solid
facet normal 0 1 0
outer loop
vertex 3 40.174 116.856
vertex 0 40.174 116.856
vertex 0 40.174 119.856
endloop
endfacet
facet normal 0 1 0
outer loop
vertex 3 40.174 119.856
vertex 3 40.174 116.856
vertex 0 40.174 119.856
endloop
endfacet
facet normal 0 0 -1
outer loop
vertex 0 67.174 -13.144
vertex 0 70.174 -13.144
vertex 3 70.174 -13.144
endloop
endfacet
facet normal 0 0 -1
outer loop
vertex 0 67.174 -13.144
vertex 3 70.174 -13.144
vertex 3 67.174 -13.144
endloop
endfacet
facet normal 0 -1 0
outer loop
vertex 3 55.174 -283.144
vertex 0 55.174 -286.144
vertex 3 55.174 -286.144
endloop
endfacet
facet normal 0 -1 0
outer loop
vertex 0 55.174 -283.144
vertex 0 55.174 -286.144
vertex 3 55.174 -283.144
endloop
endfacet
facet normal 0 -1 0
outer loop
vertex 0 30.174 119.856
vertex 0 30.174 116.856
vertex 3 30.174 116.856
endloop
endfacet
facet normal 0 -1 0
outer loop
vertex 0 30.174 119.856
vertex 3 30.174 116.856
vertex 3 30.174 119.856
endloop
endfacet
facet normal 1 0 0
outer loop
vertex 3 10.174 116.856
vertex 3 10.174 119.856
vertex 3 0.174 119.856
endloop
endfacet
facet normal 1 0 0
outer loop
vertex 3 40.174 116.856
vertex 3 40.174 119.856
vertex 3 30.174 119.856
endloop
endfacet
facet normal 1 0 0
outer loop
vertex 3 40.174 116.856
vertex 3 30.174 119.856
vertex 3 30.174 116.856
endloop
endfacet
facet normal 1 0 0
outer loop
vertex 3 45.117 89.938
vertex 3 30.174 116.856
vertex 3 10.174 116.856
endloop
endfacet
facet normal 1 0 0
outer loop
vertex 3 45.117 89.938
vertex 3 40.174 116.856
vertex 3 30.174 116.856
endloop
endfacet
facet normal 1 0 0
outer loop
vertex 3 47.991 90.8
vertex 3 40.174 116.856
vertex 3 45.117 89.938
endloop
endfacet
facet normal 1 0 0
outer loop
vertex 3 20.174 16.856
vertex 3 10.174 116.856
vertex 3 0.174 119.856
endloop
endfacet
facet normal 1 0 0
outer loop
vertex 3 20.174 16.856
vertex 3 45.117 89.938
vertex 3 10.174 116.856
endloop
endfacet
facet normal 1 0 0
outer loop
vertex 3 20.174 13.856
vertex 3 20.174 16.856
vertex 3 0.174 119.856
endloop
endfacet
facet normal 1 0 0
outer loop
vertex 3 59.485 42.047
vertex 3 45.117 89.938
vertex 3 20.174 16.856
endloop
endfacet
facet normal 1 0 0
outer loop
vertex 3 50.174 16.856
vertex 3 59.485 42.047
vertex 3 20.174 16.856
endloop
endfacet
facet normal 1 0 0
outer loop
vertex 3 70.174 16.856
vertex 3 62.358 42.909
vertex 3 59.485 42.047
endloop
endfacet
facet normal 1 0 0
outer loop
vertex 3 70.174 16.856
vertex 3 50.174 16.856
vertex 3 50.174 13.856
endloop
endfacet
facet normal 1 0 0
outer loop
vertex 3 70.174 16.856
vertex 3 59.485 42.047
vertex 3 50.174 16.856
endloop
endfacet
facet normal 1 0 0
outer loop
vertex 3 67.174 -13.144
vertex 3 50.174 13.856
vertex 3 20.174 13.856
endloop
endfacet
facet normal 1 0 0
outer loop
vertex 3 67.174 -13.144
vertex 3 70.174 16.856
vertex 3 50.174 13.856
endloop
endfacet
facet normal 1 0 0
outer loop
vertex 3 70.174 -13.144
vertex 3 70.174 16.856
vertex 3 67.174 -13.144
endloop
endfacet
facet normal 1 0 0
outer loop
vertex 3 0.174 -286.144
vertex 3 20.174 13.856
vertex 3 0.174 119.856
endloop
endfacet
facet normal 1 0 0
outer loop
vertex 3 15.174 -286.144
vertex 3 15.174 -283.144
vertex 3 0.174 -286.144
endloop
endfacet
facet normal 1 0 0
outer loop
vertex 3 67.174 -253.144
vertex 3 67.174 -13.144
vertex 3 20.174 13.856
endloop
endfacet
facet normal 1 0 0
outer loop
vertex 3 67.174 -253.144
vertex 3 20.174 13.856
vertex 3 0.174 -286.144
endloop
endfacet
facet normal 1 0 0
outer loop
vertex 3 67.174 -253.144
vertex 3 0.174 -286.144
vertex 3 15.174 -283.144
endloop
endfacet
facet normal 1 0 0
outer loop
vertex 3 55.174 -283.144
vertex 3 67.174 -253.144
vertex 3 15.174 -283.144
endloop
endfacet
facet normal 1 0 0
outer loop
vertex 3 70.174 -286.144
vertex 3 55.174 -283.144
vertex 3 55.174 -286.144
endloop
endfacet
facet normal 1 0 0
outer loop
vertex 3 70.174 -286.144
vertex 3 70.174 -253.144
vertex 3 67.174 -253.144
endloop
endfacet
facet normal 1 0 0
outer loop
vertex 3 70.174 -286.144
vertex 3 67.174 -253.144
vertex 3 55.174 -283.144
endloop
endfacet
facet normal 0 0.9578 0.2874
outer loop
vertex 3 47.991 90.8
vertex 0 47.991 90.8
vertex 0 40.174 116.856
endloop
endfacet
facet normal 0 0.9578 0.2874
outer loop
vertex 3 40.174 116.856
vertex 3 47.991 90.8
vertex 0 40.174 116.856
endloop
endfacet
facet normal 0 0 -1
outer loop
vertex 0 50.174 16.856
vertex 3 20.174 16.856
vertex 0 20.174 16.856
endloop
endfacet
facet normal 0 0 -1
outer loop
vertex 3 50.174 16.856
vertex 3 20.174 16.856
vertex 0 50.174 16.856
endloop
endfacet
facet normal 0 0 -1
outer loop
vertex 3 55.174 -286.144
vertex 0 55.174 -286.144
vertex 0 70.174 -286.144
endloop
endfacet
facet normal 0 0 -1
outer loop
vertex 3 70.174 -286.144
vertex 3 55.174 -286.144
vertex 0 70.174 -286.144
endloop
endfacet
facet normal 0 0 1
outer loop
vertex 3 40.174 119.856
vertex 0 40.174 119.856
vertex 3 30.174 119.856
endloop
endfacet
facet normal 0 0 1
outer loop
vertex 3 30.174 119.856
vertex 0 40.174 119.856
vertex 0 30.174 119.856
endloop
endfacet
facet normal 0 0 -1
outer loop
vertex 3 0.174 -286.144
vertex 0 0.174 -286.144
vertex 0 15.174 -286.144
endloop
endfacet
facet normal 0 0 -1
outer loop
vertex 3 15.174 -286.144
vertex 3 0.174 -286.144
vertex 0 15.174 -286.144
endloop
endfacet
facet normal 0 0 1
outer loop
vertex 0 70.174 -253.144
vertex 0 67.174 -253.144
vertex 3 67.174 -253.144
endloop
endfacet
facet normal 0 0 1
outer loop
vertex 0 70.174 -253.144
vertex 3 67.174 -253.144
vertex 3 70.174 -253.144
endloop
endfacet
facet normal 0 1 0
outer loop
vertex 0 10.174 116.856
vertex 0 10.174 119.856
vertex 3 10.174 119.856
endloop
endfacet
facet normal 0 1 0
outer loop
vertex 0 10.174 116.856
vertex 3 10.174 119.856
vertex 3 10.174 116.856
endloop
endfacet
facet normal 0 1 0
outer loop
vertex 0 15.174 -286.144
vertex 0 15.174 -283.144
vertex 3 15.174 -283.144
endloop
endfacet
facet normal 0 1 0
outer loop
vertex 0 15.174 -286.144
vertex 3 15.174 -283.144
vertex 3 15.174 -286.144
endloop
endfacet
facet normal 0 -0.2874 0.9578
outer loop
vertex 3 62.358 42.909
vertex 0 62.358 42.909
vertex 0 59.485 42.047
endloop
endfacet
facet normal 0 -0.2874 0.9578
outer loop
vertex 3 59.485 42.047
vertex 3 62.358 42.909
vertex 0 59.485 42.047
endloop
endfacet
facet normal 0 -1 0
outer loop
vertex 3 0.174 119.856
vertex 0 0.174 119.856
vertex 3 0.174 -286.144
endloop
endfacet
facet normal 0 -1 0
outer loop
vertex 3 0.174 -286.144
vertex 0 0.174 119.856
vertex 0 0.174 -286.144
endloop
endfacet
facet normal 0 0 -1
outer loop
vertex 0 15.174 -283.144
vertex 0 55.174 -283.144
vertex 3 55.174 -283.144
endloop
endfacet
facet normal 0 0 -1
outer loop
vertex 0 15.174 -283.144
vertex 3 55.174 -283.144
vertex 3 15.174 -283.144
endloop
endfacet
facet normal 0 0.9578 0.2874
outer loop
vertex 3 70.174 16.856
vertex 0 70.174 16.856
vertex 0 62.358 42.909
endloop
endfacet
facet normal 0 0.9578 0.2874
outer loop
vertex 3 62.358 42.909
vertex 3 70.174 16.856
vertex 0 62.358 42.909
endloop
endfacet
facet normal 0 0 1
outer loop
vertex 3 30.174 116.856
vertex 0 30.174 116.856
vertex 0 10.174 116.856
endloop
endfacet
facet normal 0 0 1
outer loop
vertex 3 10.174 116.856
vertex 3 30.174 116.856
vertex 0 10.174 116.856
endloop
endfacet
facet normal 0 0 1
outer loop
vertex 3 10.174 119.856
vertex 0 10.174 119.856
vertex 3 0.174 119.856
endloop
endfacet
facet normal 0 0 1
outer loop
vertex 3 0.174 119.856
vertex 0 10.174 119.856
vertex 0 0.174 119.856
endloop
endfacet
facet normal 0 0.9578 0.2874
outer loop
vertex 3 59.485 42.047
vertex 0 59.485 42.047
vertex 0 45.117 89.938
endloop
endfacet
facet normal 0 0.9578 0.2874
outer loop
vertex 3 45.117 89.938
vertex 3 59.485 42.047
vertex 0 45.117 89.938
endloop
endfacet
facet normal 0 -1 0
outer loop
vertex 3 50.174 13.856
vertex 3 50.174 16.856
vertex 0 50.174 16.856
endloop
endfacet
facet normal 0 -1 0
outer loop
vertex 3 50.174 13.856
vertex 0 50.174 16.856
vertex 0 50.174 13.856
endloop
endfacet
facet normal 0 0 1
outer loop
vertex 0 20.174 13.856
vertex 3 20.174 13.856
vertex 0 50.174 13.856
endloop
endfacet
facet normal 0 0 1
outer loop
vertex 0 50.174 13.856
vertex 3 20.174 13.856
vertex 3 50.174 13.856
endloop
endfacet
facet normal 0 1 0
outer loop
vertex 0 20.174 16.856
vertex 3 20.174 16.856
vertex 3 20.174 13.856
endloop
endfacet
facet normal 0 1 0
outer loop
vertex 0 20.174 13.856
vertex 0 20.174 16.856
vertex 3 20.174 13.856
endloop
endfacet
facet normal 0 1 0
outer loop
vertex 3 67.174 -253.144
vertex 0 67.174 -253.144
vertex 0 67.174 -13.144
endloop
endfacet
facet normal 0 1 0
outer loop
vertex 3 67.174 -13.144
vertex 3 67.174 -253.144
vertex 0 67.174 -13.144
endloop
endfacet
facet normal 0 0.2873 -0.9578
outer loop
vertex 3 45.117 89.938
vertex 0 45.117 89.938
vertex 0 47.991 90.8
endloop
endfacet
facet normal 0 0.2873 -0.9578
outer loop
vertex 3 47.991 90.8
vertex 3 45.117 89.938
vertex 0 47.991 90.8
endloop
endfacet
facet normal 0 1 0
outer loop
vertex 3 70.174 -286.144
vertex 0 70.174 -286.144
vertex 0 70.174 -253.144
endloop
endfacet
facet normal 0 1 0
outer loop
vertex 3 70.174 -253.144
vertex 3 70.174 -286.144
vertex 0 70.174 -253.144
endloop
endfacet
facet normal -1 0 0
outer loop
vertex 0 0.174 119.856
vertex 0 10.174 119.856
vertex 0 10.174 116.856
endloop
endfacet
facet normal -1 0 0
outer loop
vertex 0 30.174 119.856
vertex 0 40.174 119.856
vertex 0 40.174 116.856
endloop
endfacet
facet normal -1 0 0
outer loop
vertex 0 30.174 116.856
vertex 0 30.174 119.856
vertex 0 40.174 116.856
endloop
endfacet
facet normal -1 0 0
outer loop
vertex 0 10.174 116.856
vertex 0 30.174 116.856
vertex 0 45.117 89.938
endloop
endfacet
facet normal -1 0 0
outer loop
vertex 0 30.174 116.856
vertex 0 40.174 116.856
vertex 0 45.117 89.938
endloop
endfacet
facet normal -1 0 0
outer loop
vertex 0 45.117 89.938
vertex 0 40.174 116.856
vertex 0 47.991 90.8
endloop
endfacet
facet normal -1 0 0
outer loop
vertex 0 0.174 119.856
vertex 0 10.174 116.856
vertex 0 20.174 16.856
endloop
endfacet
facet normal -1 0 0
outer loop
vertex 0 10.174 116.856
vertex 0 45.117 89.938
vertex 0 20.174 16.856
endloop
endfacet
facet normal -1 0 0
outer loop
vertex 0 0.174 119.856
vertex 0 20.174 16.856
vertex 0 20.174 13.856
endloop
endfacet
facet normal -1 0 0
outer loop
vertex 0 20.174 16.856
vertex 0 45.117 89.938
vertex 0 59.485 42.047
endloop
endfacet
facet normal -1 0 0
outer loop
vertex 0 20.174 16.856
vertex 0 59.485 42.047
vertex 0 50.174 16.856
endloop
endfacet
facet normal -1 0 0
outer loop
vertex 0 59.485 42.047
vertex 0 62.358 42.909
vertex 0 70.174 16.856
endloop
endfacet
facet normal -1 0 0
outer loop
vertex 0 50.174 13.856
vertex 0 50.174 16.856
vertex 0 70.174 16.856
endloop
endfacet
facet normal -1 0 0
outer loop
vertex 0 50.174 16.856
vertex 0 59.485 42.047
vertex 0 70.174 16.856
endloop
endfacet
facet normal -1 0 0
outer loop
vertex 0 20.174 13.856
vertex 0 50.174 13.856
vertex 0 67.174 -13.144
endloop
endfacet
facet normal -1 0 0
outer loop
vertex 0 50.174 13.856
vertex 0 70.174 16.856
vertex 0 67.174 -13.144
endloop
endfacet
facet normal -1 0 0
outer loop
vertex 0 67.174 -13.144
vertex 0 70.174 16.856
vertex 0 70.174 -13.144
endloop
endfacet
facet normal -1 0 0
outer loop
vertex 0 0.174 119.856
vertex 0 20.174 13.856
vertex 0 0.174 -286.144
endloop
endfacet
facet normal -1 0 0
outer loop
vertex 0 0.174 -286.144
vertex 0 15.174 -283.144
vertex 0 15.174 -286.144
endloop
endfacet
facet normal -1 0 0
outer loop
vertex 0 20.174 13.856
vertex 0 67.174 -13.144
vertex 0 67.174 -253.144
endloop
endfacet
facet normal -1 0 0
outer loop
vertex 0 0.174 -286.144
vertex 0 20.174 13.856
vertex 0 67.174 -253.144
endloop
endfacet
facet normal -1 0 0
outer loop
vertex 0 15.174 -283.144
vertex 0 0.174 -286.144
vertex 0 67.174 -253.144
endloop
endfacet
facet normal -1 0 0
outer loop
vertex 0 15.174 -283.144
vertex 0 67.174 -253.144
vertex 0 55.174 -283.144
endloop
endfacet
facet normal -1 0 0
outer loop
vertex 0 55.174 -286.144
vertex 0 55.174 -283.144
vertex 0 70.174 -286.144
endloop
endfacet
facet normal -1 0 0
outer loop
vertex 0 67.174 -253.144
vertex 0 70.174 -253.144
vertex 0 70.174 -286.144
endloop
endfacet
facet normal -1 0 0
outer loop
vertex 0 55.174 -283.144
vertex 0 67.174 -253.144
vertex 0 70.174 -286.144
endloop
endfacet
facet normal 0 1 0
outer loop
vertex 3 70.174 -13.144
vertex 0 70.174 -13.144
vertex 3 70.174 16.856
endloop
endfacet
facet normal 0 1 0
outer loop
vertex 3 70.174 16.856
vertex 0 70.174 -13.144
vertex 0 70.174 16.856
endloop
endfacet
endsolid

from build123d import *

# Parameters (mm, degrees)
BOSS_EXTRUDE1_DEPTH      = 3
CUT_EXTRUDE2_DEPTH       = 295.638673234
CUT_EXTRUDE2_DEPTH_BACK  = 3
CUT_EXTRUDE6_DEPTH       = 295.638673234
CUT_EXTRUDE6_DEPTH_BACK  = 3
CUT_EXTRUDE11_DEPTH      = 295.638673234
CUT_EXTRUDE11_DEPTH_BACK = 3
CUT_EXTRUDE12_DEPTH      = 295.638673234
CUT_EXTRUDE12_DEPTH_BACK = 3
SKETCH9_W                = 3
SKETCH9_H                = 30
CUT_EXTRUDE13_DEPTH      = 3


with BuildPart() as part:
    # Sketch1 → Boss-Extrude1 (new body)
    with BuildSketch(Plane(origin=(0, 0, 0), x_dir=(0, 0, -1), z_dir=(1, 0, 0))):
        Polygon((286.144320394, 0.17389594), (286.144320394, 70.17389594), (-16.855679606, 70.17389594), (-116.855679606, 40.17389594), (-119.855679606, 40.17389594), (-119.855679606, 0.17389594), align=None)
    extrude(amount=BOSS_EXTRUDE1_DEPTH)

    # Sketch5 → Cut-Extrude2 (cut, two sides: drawn at the far end of the back side and taken through both)
    with BuildSketch(Plane(origin=(3, 0, 0), x_dir=(0, 0, -1), z_dir=(1, 0, 0)).offset(-CUT_EXTRUDE2_DEPTH_BACK)):
        Polygon((1115.56118622, 55.17389594), (286.144320394, 55.17389594), (283.144320394, 55.17389594), (283.144320394, 15.17389594), (286.144320394, 15.17389594), (1115.56118622, 15.17389594), (2774.394917872, 15.17389594), (2774.394917872, 55.17389594), align=None)
    extrude(amount=CUT_EXTRUDE2_DEPTH + CUT_EXTRUDE2_DEPTH_BACK, mode=Mode.SUBTRACT)

    # Sketch6 → Cut-Extrude6 (cut, two sides: drawn at the far end of the back side and taken through both)
    with BuildSketch(Plane(origin=(3, 0, 0), x_dir=(0, 0, -1), z_dir=(1, 0, 0)).offset(-CUT_EXTRUDE6_DEPTH_BACK)):
        Polygon((253.144320394, 839.196952243), (253.144320394, 70.17389594), (253.144320394, 67.17389594), (13.144320394, 67.17389594), (13.144320394, 70.17389594), (13.144320394, 839.196952243), (13.144320394, 2377.24306485), (253.144320394, 2377.24306485), align=None)
    extrude(amount=CUT_EXTRUDE6_DEPTH + CUT_EXTRUDE6_DEPTH_BACK, mode=Mode.SUBTRACT)

    # Sketch7 → Cut-Extrude11 (cut, two sides: drawn at the far end of the back side and taken through both)
    with BuildSketch(Plane(origin=(3, 0, 0), x_dir=(0, 0, -1), z_dir=(1, 0, 0)).offset(-CUT_EXTRUDE11_DEPTH_BACK)):
        Polygon((-264.146282978, 799.817128167), (-42.908554564, 62.358033452), (-42.046510907, 59.484554597), (-89.937825168, 45.117160318), (-90.799868825, 47.990639174), (-312.037597239, 785.449733889), (-754.513054068, 2260.367923318), (-706.621739807, 2274.735317597), align=None)
    extrude(amount=CUT_EXTRUDE11_DEPTH + CUT_EXTRUDE11_DEPTH_BACK, mode=Mode.SUBTRACT)

    # Sketch8 → Cut-Extrude12 (cut, two sides: drawn at the far end of the back side and taken through both)
    with BuildSketch(Plane(origin=(3, 0, 0), x_dir=(0, 0, -1), z_dir=(1, 0, 0)).offset(-CUT_EXTRUDE12_DEPTH_BACK)):
        Polygon((-950.674782697, 30.17389594), (-119.855679606, 30.17389594), (-116.855679606, 30.17389594), (-116.855679606, 10.17389594), (-119.855679606, 10.17389594), (-950.674782697, 10.17389594), (-2612.31298888, 10.17389594), (-2612.31298888, 30.17389594), align=None)
    extrude(amount=CUT_EXTRUDE12_DEPTH + CUT_EXTRUDE12_DEPTH_BACK, mode=Mode.SUBTRACT)

    # Sketch9 → Cut-Extrude13 (cut)
    with BuildSketch(Plane(origin=(3, 0, 0), x_dir=(0, 0, -1), z_dir=(1, 0, 0))):
        with Locations((-15.355679606, 35.17389594)):
            Rectangle(SKETCH9_W, SKETCH9_H)
    extrude(amount=-CUT_EXTRUDE13_DEPTH, mode=Mode.SUBTRACT)


solid = part.part
